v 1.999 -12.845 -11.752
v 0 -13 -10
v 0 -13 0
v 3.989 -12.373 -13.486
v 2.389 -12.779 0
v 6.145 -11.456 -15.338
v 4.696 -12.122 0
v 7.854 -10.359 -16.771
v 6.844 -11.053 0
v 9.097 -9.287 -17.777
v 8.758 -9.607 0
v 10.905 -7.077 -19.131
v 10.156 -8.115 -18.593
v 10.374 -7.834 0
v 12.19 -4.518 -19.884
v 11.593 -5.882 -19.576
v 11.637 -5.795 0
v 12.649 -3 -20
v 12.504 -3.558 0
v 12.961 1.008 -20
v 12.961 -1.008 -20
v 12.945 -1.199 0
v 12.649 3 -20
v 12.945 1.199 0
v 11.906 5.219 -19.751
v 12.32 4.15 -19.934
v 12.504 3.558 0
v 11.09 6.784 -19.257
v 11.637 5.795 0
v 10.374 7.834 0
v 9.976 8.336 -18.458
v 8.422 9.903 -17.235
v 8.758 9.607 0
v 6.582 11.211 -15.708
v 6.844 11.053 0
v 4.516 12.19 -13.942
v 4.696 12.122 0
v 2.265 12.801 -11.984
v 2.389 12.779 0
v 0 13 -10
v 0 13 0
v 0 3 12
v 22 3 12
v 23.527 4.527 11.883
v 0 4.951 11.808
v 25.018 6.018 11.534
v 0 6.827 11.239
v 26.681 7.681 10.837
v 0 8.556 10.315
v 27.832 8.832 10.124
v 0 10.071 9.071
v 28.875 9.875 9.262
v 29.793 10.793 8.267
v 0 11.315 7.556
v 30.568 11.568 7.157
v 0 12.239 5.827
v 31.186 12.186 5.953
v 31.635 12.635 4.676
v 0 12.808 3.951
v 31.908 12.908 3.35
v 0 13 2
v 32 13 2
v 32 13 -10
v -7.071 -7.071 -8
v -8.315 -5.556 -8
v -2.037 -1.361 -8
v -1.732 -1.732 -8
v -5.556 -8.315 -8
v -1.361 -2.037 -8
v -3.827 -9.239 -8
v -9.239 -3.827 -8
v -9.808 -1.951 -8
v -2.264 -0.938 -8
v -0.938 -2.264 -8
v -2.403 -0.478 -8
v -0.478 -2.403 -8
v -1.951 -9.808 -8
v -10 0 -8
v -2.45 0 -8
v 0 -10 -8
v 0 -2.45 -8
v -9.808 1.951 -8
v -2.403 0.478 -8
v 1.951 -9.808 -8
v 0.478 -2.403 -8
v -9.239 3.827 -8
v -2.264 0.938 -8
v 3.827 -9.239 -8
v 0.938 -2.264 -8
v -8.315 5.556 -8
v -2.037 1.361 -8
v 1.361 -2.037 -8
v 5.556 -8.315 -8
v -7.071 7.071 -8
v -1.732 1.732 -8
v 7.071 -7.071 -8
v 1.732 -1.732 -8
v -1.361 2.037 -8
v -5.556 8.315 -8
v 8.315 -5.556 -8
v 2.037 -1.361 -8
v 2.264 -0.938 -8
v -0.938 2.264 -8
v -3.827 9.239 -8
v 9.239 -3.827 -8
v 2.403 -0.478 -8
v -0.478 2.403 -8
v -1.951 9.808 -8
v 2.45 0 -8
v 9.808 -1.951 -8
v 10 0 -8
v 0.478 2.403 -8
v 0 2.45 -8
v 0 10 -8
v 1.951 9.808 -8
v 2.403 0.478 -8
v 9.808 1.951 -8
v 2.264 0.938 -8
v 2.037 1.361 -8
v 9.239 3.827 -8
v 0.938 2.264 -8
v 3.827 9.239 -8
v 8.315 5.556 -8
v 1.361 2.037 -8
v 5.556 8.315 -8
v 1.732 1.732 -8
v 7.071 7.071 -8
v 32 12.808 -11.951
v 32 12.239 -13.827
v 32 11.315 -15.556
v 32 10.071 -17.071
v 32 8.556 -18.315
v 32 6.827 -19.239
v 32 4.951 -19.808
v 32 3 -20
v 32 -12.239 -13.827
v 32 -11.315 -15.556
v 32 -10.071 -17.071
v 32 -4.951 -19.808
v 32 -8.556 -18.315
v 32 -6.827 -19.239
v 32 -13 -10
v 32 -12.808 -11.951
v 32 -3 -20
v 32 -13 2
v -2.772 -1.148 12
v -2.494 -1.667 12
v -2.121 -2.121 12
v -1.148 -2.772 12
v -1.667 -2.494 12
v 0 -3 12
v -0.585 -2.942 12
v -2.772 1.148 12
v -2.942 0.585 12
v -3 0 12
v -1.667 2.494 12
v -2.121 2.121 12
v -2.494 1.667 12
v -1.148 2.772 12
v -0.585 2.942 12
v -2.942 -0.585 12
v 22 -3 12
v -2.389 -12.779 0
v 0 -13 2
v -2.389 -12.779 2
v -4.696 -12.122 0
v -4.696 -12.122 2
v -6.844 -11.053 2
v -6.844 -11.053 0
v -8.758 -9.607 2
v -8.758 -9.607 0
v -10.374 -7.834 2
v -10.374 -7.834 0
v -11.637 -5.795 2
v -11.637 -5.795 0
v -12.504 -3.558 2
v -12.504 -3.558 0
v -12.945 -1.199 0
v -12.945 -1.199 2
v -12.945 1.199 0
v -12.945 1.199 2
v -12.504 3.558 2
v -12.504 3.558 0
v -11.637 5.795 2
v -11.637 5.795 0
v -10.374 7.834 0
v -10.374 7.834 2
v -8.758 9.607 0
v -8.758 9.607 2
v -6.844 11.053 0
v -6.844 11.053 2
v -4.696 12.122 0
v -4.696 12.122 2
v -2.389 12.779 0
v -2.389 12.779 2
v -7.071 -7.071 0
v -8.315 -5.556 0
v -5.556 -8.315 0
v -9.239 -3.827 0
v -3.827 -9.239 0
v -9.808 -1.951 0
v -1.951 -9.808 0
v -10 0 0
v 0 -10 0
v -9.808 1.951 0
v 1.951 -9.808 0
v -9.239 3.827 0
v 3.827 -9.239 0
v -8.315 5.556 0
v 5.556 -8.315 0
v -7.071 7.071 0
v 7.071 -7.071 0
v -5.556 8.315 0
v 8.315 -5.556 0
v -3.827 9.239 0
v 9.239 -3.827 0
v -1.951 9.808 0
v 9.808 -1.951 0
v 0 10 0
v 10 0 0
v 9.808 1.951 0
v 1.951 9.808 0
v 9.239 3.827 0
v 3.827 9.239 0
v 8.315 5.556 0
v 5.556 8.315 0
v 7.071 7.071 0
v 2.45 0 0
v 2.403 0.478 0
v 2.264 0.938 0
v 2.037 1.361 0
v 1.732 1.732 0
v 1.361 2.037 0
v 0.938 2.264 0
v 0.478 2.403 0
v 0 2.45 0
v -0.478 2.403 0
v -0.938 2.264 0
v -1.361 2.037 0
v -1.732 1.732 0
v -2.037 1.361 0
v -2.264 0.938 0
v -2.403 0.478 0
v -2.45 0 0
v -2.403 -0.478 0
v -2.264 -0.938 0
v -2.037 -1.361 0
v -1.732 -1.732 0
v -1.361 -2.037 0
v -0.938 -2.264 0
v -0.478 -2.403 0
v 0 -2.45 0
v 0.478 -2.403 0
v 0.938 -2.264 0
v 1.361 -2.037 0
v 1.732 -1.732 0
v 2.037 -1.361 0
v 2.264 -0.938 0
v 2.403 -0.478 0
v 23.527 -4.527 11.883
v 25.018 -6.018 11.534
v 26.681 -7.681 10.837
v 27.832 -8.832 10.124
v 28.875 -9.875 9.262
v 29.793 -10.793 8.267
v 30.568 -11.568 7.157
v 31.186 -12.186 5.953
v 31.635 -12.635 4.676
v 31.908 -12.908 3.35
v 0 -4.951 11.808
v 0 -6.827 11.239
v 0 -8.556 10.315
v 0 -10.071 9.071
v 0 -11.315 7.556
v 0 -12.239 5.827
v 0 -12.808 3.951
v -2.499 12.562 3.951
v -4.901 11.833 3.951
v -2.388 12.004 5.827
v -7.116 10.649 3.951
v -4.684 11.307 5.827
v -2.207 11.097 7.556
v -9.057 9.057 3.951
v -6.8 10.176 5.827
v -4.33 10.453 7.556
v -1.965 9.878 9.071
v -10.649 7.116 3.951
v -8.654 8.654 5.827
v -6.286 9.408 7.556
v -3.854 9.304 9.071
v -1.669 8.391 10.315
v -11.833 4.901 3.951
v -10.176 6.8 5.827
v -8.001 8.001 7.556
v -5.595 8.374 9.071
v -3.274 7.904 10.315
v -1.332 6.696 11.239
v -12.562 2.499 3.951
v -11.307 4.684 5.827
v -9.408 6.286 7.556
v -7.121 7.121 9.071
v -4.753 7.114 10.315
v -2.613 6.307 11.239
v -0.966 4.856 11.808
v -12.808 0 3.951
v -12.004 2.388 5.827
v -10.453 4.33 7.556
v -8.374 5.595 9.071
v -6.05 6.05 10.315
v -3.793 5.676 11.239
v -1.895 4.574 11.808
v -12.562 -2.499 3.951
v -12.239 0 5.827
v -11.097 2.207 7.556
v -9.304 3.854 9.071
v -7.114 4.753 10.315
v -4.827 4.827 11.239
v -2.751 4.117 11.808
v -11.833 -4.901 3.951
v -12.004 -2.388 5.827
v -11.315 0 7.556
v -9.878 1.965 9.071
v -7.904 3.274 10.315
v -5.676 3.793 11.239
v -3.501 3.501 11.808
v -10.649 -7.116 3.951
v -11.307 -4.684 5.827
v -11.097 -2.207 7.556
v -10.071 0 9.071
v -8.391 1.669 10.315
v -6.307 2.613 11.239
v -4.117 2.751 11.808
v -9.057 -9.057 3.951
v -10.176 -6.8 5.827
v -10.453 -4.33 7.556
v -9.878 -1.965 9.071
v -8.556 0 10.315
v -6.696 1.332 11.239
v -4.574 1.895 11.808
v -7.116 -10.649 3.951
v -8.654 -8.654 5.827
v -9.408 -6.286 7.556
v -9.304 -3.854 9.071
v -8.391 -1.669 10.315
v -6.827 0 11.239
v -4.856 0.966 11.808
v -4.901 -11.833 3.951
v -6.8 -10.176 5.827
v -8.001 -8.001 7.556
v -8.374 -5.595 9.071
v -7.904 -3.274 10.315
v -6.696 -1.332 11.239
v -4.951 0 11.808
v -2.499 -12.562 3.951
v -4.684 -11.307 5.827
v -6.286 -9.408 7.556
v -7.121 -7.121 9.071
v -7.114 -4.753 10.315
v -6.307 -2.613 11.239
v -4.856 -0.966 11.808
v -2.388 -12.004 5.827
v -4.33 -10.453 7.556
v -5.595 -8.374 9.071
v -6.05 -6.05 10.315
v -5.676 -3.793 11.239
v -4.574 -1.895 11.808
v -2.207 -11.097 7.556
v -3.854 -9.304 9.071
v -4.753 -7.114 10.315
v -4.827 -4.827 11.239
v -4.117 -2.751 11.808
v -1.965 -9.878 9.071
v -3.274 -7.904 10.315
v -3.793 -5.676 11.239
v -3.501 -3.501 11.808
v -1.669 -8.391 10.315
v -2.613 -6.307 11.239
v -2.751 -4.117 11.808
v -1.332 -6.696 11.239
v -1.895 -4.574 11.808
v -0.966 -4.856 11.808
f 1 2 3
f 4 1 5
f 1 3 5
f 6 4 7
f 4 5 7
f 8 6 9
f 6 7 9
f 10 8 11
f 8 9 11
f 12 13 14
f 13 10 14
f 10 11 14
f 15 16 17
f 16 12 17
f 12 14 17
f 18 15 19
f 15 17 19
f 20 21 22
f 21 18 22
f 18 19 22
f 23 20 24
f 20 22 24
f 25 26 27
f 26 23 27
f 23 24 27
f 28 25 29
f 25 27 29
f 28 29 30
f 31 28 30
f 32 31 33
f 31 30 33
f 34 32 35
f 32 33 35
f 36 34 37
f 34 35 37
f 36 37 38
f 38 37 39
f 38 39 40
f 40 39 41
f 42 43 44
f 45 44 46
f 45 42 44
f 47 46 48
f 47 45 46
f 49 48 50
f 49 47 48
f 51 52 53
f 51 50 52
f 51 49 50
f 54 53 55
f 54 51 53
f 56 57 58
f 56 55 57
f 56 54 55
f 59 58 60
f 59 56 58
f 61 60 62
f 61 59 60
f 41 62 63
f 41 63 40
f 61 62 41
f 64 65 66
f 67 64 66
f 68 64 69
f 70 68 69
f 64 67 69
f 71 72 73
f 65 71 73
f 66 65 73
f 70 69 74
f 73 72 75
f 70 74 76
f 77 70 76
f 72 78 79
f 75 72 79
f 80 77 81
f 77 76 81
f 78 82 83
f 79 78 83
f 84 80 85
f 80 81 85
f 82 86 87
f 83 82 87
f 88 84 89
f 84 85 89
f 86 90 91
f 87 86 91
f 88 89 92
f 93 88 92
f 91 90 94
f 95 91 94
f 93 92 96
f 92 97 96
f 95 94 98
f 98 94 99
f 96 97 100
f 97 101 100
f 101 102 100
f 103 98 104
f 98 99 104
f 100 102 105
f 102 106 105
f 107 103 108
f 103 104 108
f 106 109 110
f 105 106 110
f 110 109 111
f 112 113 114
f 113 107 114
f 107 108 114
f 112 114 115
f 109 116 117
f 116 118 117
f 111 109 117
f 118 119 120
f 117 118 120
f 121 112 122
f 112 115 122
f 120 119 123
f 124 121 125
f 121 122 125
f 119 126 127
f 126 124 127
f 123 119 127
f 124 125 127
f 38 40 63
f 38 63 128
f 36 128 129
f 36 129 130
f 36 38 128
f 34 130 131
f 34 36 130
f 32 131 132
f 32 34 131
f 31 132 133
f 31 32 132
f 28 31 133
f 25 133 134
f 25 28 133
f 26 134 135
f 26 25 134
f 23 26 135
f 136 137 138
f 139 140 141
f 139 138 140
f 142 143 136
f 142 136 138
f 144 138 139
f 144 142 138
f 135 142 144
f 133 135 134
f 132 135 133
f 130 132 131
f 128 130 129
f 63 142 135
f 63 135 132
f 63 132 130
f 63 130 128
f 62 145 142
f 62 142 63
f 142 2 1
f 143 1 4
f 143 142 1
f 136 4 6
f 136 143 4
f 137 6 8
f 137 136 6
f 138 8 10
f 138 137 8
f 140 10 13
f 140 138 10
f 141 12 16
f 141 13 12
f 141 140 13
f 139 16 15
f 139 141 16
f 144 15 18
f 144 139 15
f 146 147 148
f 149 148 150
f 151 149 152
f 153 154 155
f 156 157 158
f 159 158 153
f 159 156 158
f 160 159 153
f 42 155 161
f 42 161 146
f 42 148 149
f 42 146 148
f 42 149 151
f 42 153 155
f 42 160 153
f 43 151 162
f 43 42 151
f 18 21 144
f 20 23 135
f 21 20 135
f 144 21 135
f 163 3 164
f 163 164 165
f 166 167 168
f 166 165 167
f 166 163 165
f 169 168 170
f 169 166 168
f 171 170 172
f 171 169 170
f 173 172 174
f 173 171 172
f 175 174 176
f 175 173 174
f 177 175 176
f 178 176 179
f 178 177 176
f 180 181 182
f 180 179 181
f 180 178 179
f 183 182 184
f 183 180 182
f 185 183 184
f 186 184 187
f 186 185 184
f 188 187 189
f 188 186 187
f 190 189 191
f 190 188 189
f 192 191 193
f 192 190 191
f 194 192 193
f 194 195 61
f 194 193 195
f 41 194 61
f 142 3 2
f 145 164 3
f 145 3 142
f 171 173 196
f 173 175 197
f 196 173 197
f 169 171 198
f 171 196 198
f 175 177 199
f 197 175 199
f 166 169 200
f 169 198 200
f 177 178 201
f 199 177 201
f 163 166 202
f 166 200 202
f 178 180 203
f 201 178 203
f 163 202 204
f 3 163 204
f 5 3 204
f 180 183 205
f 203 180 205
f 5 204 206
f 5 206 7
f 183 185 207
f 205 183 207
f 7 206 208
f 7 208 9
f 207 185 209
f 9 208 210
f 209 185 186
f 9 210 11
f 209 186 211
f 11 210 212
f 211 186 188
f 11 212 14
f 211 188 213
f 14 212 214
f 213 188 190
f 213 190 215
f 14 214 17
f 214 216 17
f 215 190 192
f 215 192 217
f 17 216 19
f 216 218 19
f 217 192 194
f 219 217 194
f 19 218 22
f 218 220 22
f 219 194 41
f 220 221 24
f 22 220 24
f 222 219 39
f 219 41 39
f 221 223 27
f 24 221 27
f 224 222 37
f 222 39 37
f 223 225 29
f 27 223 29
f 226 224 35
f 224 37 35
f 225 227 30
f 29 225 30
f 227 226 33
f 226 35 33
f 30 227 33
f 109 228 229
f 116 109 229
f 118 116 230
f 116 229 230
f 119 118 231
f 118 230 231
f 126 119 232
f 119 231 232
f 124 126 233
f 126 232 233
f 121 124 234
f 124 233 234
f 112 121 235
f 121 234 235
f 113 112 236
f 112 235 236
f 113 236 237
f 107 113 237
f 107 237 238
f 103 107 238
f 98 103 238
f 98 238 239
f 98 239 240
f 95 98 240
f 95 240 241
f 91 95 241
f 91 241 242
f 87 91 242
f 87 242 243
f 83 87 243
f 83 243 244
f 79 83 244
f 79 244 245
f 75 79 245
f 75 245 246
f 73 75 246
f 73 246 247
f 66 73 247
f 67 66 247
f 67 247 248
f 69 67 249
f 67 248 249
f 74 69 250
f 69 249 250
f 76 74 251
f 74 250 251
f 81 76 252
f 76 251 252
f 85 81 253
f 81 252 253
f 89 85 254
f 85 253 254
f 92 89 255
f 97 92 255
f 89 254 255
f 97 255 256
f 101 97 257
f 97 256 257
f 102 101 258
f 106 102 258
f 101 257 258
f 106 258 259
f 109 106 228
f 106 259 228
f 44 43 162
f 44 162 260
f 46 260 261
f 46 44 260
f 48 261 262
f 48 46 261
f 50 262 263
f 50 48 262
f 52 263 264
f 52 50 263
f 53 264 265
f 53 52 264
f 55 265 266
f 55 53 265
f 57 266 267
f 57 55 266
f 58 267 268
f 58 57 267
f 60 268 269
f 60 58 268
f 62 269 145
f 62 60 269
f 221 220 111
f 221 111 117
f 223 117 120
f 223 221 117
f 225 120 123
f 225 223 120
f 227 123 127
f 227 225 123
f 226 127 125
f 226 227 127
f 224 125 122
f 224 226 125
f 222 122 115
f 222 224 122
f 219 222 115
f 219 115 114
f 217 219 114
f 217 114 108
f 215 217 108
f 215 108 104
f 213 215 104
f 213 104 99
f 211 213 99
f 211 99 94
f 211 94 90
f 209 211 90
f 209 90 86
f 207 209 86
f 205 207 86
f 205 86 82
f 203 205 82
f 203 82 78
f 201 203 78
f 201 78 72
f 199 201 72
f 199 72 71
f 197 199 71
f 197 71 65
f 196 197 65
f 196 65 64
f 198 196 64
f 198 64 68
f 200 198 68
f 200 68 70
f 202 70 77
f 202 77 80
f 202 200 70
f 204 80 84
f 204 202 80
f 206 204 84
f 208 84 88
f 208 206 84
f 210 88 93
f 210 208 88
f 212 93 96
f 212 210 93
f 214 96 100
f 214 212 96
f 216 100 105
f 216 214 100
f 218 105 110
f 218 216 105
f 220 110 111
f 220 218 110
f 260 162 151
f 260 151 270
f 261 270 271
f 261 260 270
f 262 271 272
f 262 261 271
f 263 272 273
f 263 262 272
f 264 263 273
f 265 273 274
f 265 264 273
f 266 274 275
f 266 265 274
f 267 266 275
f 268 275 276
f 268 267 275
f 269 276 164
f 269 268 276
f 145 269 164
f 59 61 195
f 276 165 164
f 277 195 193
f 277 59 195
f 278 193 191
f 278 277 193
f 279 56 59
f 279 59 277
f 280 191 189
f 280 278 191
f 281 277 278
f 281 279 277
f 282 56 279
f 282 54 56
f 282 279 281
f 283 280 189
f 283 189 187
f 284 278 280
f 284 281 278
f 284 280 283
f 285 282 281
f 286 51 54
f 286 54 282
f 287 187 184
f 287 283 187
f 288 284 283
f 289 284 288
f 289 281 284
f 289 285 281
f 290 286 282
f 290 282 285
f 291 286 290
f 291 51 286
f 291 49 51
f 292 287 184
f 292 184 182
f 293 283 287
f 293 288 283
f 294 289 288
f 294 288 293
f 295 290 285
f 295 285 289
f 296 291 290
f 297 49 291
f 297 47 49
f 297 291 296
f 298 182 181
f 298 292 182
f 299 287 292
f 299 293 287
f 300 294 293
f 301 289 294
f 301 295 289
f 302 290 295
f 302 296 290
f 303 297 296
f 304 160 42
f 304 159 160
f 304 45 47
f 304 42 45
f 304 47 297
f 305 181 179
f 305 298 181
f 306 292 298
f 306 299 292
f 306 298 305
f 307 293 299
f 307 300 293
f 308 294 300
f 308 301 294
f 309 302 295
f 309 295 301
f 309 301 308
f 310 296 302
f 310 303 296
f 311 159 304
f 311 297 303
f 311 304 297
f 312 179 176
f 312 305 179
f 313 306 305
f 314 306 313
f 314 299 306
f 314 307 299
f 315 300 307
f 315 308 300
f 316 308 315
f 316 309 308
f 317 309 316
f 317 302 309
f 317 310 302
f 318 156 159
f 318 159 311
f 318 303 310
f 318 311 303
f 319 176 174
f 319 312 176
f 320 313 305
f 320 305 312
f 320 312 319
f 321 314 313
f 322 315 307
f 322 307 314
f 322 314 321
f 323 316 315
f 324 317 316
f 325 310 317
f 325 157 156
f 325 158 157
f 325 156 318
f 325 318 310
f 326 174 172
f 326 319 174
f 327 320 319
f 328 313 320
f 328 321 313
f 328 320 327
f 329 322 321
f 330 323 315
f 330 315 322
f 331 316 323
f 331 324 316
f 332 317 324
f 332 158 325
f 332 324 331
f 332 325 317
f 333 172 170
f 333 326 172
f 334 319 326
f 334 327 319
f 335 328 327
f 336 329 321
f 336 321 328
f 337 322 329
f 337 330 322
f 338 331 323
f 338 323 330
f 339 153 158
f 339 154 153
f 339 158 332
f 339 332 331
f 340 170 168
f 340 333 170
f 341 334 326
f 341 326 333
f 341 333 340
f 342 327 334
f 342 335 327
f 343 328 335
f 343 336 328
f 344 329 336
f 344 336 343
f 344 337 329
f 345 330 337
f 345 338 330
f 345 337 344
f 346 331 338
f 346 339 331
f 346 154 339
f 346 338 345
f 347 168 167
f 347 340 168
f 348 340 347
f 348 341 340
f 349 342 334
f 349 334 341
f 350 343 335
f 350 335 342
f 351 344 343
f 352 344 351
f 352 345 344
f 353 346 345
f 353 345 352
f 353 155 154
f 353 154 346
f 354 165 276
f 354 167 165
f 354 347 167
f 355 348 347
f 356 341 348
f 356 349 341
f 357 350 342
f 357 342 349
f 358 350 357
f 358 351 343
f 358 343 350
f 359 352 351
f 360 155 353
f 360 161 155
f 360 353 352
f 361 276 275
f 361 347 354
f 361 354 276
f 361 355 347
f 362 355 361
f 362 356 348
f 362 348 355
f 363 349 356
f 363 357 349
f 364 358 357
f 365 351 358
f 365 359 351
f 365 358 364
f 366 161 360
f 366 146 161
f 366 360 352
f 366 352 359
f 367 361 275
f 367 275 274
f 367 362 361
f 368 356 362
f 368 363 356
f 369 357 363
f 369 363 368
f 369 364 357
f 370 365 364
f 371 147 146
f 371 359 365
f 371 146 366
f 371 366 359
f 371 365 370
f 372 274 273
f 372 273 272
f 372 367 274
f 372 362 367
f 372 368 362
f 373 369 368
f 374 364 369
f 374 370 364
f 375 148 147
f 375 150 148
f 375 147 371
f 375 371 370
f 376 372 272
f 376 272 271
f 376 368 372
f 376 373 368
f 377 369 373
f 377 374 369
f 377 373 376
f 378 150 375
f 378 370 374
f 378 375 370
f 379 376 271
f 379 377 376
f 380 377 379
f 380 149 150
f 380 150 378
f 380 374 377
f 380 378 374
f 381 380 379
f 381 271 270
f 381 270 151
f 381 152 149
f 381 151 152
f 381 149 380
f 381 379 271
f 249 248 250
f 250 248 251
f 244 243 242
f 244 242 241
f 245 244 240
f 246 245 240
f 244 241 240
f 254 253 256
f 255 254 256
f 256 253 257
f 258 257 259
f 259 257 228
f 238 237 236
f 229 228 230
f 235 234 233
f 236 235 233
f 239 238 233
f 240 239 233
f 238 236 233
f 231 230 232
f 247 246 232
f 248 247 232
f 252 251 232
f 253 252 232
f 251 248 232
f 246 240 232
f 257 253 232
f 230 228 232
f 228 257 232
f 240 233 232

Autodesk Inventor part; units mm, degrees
ref_plane "YZ Plane" through (0, 0, 0) normal (1, 0, 0) x (0, 1, 0)
ref_plane "XZ Plane" through (0, 0, 0) normal (0, 1, 0) x (-1, 0, 0)
ref_plane "XY Plane" through (0, 0, 0) normal (0, 0, 1) x (1, 0, 0)
sketch "Szkic1" plane through (0, 0, 0) normal (0, 0, 1) x (1, 0, 0)
  circle A0 centre (0, 0) radius 10
  circle A1 centre (0, 0) radius 13
  circle A2 centre (0, 0) radius 2.45
  line L0 (0, -13) -> (32, -13)
  line L1 (32, -13) -> (32, 13)
  line L2 (32, 13) -> (0, 13)
  line L3 (-32, -13) -> (32, 13) construction
  line L4 (32, -13) -> (-32, 13) construction
  dimension "d0" = 20
  dimension "d1" = 26
  dimension "d2" = 4.9
extrude "Wyciągnięcie proste1" add sketch "Szkic1" against normal blind 8 contours A0
extrude "Wyciągnięcie proste2" add sketch "Szkic1" along normal blind 12 contours A0 | A1 | A1 L2 L1 L0 | A2
extrude "Wyciągnięcie proste3" add sketch "Szkic1" against normal blind 20 contours A1 L2 L1 L0
fillet "Zaokrąglenie1" radius 10 6 edges at (16, -13, -20) (-13, 0, 12) (16, 13, 12) (16, -13, 12) (16, 13, -20) (32, 0, 12)
properties part number "cchwytak holdeer"
